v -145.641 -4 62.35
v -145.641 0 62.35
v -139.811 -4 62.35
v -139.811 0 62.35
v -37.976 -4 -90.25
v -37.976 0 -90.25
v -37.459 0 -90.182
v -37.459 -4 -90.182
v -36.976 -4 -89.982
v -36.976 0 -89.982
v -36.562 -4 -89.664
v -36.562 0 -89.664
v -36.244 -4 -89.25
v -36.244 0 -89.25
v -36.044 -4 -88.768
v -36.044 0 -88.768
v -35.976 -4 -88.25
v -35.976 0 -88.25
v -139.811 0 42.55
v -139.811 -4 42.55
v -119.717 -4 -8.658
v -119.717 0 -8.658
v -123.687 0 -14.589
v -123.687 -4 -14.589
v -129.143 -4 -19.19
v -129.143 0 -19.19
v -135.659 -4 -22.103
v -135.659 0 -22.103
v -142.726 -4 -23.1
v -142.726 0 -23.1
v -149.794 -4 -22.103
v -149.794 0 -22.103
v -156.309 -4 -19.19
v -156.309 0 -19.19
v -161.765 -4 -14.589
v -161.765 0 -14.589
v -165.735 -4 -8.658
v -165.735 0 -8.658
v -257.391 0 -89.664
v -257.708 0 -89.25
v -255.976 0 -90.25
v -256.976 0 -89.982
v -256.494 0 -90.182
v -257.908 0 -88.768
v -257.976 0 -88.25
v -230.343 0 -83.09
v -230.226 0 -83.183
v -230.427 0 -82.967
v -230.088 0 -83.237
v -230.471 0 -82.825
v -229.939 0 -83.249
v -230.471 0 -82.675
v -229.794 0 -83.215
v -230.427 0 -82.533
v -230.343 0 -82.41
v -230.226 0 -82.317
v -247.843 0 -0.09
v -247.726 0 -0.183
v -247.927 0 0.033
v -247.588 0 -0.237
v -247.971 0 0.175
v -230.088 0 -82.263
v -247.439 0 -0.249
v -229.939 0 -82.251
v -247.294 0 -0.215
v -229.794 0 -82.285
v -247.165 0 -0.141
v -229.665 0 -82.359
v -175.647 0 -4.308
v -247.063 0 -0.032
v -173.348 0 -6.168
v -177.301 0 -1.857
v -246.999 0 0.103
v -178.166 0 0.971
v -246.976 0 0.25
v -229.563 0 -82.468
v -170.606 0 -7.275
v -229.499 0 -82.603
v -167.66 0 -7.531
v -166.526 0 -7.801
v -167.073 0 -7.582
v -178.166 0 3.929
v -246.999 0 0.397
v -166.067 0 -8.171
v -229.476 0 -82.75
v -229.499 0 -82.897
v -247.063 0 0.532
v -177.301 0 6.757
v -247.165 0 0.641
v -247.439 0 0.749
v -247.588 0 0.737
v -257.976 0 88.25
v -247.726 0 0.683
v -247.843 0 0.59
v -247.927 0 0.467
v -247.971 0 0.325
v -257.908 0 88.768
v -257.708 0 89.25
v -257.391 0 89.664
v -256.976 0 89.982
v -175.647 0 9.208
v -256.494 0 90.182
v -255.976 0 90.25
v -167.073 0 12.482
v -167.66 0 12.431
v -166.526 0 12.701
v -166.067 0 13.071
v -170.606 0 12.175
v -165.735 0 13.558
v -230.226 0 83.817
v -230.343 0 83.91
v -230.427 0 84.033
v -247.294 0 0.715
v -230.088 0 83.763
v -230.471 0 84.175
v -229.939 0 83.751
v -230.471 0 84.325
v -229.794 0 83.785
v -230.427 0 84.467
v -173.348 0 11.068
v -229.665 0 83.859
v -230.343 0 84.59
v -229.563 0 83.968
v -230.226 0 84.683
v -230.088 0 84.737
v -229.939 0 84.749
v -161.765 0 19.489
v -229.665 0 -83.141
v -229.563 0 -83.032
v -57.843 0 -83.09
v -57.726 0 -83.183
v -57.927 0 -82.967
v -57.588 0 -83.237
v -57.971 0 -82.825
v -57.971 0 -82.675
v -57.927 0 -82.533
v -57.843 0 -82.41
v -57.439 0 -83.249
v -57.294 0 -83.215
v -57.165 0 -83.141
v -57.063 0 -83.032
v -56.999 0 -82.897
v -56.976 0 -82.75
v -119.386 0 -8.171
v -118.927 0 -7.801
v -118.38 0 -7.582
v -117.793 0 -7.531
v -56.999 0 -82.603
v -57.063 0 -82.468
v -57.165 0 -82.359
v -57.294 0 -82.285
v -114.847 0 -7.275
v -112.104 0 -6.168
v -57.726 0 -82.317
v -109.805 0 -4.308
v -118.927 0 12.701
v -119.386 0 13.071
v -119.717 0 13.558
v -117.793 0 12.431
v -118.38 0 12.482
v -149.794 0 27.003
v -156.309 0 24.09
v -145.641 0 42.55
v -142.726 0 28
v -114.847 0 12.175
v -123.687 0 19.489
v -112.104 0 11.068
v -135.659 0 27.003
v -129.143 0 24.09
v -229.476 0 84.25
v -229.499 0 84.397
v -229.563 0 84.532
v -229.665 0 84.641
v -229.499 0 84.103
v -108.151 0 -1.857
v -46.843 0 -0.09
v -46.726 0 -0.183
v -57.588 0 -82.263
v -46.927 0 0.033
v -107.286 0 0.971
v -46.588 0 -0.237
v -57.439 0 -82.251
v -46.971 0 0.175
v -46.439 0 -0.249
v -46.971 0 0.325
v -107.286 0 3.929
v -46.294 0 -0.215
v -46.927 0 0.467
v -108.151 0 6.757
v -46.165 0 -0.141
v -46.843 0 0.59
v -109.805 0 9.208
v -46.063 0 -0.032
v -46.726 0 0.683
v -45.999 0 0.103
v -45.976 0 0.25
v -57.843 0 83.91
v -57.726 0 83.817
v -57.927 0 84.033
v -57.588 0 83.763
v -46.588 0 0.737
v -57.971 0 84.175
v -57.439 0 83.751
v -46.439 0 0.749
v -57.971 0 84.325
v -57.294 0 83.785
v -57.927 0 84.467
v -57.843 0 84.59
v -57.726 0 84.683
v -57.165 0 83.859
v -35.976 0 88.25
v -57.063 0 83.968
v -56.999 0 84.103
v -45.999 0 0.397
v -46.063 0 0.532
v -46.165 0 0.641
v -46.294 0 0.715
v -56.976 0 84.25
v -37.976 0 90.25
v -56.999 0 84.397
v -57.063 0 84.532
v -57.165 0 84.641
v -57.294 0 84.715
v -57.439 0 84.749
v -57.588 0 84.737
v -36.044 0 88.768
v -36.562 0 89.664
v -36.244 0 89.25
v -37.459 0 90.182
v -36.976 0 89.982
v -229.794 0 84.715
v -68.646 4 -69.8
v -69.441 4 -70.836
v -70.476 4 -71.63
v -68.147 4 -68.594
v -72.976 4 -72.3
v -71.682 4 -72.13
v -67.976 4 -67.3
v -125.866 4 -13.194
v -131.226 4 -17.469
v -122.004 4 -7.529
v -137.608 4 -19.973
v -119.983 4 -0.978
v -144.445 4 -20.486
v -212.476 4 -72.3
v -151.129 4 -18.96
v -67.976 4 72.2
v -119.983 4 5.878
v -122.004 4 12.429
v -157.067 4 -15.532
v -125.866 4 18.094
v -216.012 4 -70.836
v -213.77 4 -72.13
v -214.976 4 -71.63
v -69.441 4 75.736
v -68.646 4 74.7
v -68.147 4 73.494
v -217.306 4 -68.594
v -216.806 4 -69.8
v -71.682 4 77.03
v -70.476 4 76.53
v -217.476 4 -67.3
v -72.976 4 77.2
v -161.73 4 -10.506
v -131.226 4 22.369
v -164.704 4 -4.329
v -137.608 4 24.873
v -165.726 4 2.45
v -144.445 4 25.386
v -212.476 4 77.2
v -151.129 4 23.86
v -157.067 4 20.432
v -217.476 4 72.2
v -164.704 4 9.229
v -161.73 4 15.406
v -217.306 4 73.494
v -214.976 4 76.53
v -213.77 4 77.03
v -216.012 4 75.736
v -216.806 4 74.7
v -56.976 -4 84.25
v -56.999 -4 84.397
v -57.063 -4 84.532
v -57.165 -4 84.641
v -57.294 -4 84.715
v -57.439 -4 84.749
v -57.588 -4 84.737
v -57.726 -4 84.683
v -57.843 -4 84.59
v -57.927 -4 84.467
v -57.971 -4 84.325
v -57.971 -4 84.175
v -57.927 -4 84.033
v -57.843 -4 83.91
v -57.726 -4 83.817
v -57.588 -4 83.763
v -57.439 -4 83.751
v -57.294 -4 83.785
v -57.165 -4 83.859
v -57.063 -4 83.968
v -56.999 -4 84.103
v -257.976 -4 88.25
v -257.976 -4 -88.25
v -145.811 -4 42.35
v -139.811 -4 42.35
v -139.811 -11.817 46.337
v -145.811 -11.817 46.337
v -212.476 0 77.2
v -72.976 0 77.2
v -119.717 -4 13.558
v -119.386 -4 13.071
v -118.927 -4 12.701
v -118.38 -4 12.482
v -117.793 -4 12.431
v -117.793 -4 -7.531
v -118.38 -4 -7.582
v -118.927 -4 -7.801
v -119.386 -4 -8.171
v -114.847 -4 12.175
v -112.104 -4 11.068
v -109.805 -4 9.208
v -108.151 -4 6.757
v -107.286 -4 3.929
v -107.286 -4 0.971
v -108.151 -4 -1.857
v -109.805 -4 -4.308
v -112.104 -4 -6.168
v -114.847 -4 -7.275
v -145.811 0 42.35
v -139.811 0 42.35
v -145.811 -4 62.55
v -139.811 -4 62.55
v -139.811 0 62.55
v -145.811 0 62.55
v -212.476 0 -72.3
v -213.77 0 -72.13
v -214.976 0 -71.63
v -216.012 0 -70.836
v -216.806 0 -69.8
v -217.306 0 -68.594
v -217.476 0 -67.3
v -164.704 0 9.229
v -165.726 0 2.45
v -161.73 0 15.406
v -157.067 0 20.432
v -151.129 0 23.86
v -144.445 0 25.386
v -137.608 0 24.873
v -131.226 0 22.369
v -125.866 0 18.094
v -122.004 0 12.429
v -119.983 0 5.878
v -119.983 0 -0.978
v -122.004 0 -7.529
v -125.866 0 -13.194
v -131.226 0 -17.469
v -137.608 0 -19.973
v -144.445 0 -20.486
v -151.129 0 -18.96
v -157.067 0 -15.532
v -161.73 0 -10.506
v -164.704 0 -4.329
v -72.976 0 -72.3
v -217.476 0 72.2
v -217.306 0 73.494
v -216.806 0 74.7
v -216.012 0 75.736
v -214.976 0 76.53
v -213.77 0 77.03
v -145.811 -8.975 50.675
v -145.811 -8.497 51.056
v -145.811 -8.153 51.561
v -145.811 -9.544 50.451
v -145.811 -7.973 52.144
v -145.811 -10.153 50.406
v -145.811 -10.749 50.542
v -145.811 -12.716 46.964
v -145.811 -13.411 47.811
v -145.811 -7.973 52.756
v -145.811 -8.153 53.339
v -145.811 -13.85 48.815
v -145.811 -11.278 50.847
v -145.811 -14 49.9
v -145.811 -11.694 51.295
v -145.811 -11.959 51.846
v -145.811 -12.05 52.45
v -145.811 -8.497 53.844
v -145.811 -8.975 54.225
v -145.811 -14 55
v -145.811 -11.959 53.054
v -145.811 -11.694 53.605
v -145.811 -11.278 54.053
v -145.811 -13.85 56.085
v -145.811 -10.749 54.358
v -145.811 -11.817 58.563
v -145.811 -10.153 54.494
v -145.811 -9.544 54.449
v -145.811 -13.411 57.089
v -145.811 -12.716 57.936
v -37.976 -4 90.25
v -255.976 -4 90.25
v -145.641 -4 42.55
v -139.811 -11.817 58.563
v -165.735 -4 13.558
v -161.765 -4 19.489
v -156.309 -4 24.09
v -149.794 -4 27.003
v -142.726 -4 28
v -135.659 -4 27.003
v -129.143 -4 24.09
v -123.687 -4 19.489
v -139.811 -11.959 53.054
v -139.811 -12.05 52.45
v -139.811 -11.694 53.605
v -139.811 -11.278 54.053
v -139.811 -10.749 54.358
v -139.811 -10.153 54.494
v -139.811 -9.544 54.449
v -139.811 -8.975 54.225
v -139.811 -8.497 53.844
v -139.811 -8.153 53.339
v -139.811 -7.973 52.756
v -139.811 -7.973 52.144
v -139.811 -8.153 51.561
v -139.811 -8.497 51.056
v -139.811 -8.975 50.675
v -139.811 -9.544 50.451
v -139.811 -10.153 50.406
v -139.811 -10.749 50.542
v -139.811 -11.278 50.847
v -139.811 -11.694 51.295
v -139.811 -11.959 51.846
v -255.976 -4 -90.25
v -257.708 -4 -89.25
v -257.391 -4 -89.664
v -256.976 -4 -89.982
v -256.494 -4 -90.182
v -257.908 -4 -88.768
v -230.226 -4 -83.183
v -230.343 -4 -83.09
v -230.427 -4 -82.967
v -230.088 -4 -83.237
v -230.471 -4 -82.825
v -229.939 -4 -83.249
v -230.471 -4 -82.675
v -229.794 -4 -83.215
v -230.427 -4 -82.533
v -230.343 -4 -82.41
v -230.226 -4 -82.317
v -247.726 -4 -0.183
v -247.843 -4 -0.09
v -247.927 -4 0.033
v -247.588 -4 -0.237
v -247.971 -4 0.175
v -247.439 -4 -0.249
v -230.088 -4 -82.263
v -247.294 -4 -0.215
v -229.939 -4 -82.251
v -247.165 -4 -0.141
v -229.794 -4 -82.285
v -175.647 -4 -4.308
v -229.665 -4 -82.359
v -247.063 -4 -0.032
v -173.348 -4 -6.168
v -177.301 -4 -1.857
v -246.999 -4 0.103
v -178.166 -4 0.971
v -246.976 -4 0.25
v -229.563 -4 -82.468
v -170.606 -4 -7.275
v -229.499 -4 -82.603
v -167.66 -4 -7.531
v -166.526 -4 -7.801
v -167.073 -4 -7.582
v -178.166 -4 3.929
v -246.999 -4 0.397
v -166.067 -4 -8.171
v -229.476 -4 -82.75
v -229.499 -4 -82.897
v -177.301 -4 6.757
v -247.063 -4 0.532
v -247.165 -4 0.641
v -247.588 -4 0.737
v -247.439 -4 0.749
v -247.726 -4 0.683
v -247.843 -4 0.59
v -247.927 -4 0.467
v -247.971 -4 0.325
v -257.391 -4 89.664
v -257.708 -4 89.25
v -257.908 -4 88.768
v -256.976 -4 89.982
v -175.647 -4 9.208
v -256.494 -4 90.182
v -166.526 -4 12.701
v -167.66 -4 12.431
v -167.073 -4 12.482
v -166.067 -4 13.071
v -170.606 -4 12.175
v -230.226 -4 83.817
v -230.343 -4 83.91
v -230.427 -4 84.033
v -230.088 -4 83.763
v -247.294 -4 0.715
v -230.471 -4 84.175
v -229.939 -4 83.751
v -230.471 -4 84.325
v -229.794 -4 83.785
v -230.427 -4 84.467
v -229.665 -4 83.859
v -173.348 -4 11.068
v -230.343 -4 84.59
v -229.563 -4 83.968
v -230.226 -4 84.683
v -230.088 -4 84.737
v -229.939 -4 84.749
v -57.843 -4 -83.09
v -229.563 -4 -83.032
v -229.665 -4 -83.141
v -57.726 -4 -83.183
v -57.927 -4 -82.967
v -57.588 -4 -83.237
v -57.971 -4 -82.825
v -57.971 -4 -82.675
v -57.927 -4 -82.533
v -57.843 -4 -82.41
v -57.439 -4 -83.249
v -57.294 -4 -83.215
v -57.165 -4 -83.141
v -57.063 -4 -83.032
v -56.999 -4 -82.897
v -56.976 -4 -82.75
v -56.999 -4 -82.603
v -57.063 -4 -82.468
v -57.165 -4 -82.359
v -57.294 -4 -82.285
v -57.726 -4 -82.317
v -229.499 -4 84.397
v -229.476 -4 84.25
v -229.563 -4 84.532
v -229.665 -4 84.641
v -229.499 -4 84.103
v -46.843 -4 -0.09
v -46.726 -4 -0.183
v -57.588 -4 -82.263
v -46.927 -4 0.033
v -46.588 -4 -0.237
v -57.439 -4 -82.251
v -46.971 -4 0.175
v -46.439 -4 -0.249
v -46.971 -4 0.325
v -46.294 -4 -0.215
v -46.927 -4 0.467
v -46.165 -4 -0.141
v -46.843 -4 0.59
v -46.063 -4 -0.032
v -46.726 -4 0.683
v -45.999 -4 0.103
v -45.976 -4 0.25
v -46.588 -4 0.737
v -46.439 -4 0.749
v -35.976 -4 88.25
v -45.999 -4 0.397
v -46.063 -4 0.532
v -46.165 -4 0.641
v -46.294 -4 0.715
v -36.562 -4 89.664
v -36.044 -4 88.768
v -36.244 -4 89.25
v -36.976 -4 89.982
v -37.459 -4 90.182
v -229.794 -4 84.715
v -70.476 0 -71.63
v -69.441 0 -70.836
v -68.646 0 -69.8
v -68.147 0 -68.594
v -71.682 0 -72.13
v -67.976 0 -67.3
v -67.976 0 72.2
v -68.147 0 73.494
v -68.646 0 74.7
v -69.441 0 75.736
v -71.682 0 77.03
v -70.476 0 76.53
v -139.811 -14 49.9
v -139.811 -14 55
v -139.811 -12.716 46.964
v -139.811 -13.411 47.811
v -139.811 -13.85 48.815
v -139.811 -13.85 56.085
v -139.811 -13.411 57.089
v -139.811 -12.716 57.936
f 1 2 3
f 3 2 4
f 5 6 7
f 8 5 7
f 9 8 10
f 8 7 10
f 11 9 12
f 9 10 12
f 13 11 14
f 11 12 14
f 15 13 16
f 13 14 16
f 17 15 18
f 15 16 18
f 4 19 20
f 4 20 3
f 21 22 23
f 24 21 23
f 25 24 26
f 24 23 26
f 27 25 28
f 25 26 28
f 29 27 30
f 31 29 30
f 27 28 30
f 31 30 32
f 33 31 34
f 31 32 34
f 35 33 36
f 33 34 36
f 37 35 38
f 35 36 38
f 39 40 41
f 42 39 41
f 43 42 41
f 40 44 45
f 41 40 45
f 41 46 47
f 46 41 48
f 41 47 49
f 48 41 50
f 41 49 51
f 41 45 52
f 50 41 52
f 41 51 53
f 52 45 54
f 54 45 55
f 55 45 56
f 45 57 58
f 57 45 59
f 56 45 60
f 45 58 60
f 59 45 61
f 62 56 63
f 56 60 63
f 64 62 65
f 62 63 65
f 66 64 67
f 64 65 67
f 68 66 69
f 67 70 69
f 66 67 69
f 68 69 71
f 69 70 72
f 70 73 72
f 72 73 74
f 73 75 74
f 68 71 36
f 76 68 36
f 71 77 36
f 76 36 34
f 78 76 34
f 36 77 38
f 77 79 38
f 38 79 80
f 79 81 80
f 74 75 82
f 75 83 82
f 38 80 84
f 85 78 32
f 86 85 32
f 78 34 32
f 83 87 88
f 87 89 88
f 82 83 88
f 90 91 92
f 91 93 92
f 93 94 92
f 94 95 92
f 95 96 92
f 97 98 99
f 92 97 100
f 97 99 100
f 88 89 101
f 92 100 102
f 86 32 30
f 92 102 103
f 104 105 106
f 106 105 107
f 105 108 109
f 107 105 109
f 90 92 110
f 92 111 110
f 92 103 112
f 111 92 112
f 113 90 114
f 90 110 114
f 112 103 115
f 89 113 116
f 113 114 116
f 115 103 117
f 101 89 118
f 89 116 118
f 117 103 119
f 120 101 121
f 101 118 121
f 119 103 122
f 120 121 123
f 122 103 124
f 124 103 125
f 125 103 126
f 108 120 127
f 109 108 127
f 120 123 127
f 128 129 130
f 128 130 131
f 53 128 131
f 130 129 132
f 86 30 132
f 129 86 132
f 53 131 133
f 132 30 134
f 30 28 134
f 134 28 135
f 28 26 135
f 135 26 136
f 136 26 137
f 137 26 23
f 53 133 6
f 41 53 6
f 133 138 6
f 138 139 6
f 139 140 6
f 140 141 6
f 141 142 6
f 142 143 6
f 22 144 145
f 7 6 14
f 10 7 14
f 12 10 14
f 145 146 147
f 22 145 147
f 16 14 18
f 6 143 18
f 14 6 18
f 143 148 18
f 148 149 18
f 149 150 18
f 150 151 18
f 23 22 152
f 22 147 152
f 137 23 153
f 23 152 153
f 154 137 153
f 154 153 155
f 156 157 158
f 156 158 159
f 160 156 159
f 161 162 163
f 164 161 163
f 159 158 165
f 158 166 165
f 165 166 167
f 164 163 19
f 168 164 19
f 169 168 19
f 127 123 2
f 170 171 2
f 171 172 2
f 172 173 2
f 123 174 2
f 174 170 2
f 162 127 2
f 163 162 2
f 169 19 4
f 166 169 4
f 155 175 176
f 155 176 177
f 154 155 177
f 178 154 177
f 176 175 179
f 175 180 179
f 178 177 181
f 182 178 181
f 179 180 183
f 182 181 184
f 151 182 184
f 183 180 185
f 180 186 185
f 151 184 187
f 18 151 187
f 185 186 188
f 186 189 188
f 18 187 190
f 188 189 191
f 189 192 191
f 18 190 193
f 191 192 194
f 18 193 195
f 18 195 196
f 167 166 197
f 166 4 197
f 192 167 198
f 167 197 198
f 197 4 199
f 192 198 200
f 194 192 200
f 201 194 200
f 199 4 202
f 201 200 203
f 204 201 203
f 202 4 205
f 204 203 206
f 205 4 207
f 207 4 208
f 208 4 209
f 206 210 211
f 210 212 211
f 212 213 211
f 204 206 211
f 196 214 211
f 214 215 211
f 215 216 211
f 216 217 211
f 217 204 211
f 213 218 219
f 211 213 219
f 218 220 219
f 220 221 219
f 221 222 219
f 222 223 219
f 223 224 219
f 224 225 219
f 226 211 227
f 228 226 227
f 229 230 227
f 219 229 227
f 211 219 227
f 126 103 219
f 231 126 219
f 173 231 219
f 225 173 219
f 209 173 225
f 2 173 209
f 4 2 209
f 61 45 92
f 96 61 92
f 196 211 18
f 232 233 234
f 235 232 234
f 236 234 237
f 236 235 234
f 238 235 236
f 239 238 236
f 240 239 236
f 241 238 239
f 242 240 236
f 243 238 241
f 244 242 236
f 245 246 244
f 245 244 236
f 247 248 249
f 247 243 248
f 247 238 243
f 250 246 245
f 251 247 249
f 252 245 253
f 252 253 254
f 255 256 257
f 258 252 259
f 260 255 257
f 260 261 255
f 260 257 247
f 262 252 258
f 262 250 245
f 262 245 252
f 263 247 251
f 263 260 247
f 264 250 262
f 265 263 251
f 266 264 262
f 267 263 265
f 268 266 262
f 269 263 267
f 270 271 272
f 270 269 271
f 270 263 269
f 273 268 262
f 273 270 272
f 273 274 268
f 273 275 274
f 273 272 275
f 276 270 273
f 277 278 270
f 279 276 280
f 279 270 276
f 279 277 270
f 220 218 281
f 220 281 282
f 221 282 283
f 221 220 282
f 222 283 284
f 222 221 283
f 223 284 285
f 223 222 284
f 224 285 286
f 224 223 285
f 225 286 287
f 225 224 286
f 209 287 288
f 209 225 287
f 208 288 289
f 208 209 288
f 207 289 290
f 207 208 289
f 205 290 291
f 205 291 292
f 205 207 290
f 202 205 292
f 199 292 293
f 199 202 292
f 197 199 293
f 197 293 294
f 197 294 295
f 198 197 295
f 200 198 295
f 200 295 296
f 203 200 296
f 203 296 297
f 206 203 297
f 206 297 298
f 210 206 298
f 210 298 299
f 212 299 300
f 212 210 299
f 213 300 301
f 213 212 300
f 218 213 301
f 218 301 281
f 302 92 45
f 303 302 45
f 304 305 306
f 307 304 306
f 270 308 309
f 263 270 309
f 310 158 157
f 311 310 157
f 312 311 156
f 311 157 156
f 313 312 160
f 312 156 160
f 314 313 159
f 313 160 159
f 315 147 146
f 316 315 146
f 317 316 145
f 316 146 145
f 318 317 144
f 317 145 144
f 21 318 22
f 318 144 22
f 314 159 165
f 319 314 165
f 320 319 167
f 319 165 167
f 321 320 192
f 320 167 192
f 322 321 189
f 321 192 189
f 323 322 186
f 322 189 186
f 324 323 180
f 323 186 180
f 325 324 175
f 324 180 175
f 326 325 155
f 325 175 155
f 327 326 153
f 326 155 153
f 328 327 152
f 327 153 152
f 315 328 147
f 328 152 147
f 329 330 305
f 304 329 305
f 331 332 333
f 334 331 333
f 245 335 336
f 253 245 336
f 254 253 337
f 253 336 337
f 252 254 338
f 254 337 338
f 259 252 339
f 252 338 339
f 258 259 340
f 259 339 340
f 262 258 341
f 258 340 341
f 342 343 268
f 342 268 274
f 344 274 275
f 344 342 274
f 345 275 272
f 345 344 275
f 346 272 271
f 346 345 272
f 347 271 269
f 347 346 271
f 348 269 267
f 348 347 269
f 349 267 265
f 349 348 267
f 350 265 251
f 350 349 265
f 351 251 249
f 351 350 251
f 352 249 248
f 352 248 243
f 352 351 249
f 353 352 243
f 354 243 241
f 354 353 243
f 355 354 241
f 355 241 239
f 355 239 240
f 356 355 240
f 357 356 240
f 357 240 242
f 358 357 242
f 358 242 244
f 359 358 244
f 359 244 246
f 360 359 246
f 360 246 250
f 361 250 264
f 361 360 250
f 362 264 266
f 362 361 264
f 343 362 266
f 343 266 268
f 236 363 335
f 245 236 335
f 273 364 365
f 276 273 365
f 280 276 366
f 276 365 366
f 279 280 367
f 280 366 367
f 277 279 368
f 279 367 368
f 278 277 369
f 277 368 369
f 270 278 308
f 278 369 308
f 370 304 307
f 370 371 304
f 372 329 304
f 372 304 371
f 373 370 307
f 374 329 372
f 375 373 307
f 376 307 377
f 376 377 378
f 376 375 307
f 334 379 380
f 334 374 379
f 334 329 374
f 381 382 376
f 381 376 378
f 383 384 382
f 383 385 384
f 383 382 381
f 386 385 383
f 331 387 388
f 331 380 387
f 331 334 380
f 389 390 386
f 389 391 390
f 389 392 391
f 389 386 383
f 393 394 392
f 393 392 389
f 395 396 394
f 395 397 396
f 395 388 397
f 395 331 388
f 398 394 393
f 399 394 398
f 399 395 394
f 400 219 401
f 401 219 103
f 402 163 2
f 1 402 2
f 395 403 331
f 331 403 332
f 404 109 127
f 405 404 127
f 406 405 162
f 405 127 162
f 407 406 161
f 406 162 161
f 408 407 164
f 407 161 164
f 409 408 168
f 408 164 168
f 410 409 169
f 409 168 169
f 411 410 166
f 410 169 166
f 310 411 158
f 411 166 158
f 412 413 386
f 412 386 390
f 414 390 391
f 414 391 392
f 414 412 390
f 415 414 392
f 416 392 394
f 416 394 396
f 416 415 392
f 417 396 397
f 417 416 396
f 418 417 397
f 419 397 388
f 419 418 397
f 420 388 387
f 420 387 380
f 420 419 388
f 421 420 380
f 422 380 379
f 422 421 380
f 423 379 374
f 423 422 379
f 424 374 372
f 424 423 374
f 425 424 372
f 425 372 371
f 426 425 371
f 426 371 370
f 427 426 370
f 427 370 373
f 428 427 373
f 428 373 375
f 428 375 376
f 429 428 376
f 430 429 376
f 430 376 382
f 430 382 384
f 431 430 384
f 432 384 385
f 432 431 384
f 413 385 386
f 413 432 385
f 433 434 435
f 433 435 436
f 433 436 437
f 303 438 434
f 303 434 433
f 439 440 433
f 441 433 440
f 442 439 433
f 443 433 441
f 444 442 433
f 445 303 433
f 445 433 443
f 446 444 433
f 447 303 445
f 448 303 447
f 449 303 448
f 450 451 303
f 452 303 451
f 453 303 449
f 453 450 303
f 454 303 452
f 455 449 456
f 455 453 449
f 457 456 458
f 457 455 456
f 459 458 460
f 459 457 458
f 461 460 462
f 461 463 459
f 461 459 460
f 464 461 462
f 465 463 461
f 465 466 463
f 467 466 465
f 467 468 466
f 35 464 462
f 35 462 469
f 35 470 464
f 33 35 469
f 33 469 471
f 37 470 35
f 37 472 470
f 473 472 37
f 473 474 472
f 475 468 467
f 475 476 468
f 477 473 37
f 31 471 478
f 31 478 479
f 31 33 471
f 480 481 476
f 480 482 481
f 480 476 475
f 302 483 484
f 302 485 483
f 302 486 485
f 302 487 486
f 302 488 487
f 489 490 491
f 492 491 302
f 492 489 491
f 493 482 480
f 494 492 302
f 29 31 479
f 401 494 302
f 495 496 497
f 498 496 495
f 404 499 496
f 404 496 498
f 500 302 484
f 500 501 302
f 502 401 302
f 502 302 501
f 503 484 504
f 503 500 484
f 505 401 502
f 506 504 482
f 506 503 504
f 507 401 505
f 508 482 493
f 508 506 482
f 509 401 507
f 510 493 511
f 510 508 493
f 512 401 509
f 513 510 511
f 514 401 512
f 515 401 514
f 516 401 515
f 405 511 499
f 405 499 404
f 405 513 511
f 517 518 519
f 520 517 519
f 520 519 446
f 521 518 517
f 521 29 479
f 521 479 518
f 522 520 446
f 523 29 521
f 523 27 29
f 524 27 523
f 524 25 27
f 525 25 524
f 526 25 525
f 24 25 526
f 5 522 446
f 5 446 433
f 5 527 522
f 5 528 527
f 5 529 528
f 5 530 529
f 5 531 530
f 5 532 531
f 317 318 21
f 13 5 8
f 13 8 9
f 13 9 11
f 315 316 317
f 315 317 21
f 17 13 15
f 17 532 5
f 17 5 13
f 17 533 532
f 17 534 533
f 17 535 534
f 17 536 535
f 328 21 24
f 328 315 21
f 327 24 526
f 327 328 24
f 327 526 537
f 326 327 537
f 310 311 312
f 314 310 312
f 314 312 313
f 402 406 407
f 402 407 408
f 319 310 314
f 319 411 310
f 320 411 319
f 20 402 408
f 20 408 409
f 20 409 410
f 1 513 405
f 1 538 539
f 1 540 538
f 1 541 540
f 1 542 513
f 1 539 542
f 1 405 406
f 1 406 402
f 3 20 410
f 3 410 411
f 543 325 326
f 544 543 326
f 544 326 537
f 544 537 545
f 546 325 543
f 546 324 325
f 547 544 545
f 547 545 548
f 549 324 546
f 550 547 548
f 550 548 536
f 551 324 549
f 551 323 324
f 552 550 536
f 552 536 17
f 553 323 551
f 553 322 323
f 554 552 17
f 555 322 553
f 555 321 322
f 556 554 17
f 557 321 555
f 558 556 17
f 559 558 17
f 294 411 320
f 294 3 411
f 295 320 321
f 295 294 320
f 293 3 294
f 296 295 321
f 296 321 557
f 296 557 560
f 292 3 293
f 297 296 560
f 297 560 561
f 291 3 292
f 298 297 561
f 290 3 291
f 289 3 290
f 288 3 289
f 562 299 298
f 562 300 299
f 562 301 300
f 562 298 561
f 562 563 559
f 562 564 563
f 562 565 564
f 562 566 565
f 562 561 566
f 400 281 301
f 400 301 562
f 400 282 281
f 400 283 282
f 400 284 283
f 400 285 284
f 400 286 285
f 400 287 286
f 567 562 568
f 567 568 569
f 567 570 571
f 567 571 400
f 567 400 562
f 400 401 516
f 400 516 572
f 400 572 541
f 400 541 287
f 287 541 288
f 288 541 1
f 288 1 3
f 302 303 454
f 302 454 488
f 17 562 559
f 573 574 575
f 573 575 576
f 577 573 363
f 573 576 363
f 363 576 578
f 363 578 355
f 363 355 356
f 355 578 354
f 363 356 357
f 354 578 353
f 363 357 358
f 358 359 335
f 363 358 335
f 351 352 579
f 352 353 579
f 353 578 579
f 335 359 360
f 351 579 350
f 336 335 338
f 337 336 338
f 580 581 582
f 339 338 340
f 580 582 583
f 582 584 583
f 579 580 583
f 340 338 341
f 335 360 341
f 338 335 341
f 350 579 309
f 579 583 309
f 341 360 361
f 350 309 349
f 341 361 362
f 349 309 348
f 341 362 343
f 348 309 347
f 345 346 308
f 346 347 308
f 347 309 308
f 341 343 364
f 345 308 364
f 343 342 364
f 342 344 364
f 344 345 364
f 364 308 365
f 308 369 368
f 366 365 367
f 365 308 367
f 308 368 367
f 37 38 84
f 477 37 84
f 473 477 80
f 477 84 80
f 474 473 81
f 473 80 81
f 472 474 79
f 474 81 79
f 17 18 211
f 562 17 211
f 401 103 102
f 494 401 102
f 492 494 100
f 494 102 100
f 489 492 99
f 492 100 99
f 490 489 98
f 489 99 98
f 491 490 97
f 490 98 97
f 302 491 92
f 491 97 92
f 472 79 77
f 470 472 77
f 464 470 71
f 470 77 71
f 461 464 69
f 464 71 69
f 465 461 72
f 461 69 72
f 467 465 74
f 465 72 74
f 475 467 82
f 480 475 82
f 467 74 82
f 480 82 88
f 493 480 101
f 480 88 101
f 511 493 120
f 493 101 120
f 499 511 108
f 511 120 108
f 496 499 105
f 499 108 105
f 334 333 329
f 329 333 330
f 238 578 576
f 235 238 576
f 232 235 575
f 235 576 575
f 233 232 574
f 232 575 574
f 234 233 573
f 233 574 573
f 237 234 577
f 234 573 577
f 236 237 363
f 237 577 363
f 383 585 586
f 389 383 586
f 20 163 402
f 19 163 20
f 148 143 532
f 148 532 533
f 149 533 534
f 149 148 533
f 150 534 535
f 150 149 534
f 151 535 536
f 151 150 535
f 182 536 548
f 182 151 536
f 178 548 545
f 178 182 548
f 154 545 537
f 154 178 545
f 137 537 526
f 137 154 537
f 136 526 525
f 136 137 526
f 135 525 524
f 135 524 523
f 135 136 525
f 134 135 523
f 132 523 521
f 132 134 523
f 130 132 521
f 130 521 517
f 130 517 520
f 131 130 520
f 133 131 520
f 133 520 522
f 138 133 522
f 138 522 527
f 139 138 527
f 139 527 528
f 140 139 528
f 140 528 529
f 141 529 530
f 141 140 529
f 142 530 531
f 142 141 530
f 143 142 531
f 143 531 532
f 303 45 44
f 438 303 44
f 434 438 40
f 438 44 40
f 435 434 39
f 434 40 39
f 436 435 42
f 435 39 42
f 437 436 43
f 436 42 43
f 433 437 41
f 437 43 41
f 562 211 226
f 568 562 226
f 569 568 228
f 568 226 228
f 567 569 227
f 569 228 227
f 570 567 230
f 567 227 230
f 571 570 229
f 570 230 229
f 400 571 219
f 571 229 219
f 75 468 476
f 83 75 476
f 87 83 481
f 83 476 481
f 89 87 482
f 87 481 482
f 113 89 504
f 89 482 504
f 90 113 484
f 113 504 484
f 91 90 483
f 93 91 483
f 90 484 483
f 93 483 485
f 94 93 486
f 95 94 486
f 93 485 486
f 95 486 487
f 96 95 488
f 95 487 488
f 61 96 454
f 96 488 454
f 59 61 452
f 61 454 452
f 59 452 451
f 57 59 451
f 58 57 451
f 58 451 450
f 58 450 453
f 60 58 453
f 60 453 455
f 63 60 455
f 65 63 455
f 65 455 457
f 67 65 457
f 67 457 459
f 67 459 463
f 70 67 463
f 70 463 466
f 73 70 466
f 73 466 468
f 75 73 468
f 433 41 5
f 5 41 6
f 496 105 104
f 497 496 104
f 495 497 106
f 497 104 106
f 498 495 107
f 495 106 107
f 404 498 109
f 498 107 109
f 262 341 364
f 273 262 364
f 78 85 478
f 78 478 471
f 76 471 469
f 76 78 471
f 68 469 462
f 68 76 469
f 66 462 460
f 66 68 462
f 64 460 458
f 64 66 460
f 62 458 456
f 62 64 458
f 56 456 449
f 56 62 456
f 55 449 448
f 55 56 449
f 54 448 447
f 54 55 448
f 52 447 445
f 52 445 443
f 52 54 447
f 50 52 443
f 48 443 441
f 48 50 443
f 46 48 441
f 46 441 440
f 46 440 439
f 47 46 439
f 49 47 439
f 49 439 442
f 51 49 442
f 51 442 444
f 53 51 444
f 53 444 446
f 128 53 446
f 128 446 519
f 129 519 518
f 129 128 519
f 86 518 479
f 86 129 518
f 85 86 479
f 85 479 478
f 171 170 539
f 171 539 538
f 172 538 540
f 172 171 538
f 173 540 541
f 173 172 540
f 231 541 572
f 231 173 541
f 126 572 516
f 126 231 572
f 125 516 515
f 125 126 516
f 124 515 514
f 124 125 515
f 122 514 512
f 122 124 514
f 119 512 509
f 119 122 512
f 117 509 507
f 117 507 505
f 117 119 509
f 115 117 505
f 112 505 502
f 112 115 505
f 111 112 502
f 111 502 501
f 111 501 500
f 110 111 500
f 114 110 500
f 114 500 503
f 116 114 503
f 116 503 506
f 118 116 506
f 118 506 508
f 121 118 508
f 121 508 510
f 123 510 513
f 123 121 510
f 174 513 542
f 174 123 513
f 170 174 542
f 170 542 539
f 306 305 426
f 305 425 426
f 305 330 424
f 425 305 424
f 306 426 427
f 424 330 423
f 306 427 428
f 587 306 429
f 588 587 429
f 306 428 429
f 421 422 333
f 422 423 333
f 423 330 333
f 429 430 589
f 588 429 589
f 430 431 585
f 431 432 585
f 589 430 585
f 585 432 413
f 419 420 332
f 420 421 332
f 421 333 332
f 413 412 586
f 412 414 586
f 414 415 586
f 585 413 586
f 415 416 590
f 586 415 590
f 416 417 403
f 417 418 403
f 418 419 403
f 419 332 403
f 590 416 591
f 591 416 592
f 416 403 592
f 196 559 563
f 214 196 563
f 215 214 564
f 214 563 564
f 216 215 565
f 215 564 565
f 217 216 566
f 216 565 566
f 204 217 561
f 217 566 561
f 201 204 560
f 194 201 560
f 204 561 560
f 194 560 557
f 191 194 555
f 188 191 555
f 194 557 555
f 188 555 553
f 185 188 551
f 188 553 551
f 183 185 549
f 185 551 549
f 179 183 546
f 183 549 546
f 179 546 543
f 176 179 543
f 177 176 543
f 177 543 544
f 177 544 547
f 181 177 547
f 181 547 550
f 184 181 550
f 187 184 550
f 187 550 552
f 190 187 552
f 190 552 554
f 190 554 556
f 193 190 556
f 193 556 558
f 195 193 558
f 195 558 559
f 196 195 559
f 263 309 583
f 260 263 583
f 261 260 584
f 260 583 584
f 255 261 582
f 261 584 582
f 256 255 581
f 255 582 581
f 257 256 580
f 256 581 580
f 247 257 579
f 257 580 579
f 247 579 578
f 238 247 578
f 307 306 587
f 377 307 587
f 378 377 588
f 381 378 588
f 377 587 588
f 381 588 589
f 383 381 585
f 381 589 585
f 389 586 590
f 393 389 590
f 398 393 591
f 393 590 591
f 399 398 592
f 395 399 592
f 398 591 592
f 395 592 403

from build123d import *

# Parameters (mm, degrees)
F0_R     = 0.5
F0_W     = 5.83
F0_H     = 19.8
F1_DEPTH = 4
F2_R     = 23
F3_DEPTH = 4
F4_R     = 2.05
F4_W     = 4
F4_H     = 19.8
F5_DEPTH = 6
F6_R     = 0.5
F7_DEPTH = 25


with BuildPart() as f1:
    # F0 (on Front) → F1 (new body)
    with BuildSketch(Plane.XZ):
        with BuildLine():
            ThreePointArc((-35.976313, 88.25), (-36.562099, 89.664214), (-37.976313, 90.25))
            Line((-37.976313, 90.25), (-255.976313, 90.25))
            ThreePointArc((-255.976313, 90.25), (-257.390526, 89.664214), (-257.976313, 88.25))
            Line((-257.976313, 88.25), (-257.976313, -88.25))
            ThreePointArc((-257.976313, -88.25), (-257.390526, -89.664214), (-255.976313, -90.25))
            Line((-255.976313, -90.25), (-37.976313, -90.25))
            ThreePointArc((-37.976313, -90.25), (-36.562099, -89.664214), (-35.976313, -88.25))
            Line((-35.976313, -88.25), (-35.976313, 88.25))
        make_face()
        with Locations((-229.976313, -82.75)):
            Circle(F0_R, mode=Mode.SUBTRACT)
        with Locations((-57.476313, -82.75)):
            Circle(F0_R, mode=Mode.SUBTRACT)
        with Locations((-229.976313, 84.25)):
            Circle(F0_R, mode=Mode.SUBTRACT)
        with BuildLine():
            ThreePointArc((-167.659875, -7.530982), (-178.276313, 2.45), (-167.659875, 12.430982))
            ThreePointArc((-167.659875, 12.430982), (-166.526072, 12.701241), (-165.735478, 13.557692))
            ThreePointArc((-165.735478, 13.557692), (-142.726313, 28), (-119.717148, 13.557692))
            ThreePointArc((-119.717148, 13.557692), (-118.926554, 12.701241), (-117.792751, 12.430982))
            ThreePointArc((-117.792751, 12.430982), (-107.176313, 2.45), (-117.792751, -7.530982))
            ThreePointArc((-117.792751, -7.530982), (-118.926554, -7.801241), (-119.717148, -8.657692))
            ThreePointArc((-119.717148, -8.657692), (-142.726313, -23.1), (-165.735478, -8.657692))
            ThreePointArc((-165.735478, -8.657692), (-166.526072, -7.801241), (-167.659875, -7.530982))
        make_face(mode=Mode.SUBTRACT)
        with Locations((-142.726313, 52.45)):
            Rectangle(F0_W, F0_H, mode=Mode.SUBTRACT)
        with Locations((-57.476313, 84.25)):
            Circle(F0_R, mode=Mode.SUBTRACT)
    extrude(amount=F1_DEPTH)

    # F6 (on face) → F7 (cut)
    with BuildSketch(Plane.XZ.offset(4)):
        with Locations((-247.476313, 0.25)):
            Circle(F6_R)
        with Locations((-46.476313, 0.25)):
            Circle(F6_R)
    extrude(amount=-F7_DEPTH, mode=Mode.SUBTRACT)


with BuildPart() as f3:
    # F2 (on face) → F3 (new body)
    with BuildSketch(Plane(origin=(0, 0, 0), x_dir=(-1, 0, 0), z_dir=(0, 1, 0))):
        with BuildLine():
            ThreePointArc((67.976313, -67.3), (69.440779, -70.835534), (72.976313, -72.3))
            Line((72.976313, -72.3), (212.476313, -72.3))
            ThreePointArc((212.476313, -72.3), (216.011847, -70.835534), (217.476313, -67.3))
            Line((217.476313, -67.3), (217.476313, 72.2))
            ThreePointArc((217.476313, 72.2), (216.011847, 75.735534), (212.476313, 77.2))
            Line((212.476313, 77.2), (72.976313, 77.2))
            ThreePointArc((72.976313, 77.2), (69.440779, 75.735534), (67.976313, 72.2))
            Line((67.976313, 72.2), (67.976313, -67.3))
        make_face()
        with Locations((142.726313, 2.45)):
            Circle(F2_R, mode=Mode.SUBTRACT)
    extrude(amount=F3_DEPTH)


with BuildPart() as f5:
    # F4 (on face) → F5 (new body)
    with BuildSketch(Plane(origin=(-139.811313, 0, 0), x_dir=(0, -1, 0), z_dir=(-1, 0, 0))):
        with BuildLine():
            Line((4, 42.55), (0, 42.55))
            Line((0, 42.55), (0, 42.35))
            Line((0, 42.35), (4, 42.35))
            Line((4, 42.35), (11.817304, 46.336825))
            ThreePointArc((11.817304, 46.336825), (13.410954, 47.810815), (14, 49.900167))
            Line((14, 49.900167), (14, 54.999833))
            ThreePointArc((14, 54.999833), (13.410954, 57.089185), (11.817304, 58.563175))
            Line((11.817304, 58.563175), (4, 62.55))
            Line((4, 62.55), (0, 62.55))
            Line((0, 62.55), (0, 62.35))
            Line((0, 62.35), (4, 62.35))
            Line((4, 62.35), (4, 42.55))
        make_face()
        with Locations((10, 52.45)):
            Circle(F4_R, mode=Mode.SUBTRACT)
        with Locations((2, 52.45)):
            Rectangle(F4_W, F4_H)
    extrude(amount=F5_DEPTH)


solid = Compound([f1.part, f3.part, f5.part])
